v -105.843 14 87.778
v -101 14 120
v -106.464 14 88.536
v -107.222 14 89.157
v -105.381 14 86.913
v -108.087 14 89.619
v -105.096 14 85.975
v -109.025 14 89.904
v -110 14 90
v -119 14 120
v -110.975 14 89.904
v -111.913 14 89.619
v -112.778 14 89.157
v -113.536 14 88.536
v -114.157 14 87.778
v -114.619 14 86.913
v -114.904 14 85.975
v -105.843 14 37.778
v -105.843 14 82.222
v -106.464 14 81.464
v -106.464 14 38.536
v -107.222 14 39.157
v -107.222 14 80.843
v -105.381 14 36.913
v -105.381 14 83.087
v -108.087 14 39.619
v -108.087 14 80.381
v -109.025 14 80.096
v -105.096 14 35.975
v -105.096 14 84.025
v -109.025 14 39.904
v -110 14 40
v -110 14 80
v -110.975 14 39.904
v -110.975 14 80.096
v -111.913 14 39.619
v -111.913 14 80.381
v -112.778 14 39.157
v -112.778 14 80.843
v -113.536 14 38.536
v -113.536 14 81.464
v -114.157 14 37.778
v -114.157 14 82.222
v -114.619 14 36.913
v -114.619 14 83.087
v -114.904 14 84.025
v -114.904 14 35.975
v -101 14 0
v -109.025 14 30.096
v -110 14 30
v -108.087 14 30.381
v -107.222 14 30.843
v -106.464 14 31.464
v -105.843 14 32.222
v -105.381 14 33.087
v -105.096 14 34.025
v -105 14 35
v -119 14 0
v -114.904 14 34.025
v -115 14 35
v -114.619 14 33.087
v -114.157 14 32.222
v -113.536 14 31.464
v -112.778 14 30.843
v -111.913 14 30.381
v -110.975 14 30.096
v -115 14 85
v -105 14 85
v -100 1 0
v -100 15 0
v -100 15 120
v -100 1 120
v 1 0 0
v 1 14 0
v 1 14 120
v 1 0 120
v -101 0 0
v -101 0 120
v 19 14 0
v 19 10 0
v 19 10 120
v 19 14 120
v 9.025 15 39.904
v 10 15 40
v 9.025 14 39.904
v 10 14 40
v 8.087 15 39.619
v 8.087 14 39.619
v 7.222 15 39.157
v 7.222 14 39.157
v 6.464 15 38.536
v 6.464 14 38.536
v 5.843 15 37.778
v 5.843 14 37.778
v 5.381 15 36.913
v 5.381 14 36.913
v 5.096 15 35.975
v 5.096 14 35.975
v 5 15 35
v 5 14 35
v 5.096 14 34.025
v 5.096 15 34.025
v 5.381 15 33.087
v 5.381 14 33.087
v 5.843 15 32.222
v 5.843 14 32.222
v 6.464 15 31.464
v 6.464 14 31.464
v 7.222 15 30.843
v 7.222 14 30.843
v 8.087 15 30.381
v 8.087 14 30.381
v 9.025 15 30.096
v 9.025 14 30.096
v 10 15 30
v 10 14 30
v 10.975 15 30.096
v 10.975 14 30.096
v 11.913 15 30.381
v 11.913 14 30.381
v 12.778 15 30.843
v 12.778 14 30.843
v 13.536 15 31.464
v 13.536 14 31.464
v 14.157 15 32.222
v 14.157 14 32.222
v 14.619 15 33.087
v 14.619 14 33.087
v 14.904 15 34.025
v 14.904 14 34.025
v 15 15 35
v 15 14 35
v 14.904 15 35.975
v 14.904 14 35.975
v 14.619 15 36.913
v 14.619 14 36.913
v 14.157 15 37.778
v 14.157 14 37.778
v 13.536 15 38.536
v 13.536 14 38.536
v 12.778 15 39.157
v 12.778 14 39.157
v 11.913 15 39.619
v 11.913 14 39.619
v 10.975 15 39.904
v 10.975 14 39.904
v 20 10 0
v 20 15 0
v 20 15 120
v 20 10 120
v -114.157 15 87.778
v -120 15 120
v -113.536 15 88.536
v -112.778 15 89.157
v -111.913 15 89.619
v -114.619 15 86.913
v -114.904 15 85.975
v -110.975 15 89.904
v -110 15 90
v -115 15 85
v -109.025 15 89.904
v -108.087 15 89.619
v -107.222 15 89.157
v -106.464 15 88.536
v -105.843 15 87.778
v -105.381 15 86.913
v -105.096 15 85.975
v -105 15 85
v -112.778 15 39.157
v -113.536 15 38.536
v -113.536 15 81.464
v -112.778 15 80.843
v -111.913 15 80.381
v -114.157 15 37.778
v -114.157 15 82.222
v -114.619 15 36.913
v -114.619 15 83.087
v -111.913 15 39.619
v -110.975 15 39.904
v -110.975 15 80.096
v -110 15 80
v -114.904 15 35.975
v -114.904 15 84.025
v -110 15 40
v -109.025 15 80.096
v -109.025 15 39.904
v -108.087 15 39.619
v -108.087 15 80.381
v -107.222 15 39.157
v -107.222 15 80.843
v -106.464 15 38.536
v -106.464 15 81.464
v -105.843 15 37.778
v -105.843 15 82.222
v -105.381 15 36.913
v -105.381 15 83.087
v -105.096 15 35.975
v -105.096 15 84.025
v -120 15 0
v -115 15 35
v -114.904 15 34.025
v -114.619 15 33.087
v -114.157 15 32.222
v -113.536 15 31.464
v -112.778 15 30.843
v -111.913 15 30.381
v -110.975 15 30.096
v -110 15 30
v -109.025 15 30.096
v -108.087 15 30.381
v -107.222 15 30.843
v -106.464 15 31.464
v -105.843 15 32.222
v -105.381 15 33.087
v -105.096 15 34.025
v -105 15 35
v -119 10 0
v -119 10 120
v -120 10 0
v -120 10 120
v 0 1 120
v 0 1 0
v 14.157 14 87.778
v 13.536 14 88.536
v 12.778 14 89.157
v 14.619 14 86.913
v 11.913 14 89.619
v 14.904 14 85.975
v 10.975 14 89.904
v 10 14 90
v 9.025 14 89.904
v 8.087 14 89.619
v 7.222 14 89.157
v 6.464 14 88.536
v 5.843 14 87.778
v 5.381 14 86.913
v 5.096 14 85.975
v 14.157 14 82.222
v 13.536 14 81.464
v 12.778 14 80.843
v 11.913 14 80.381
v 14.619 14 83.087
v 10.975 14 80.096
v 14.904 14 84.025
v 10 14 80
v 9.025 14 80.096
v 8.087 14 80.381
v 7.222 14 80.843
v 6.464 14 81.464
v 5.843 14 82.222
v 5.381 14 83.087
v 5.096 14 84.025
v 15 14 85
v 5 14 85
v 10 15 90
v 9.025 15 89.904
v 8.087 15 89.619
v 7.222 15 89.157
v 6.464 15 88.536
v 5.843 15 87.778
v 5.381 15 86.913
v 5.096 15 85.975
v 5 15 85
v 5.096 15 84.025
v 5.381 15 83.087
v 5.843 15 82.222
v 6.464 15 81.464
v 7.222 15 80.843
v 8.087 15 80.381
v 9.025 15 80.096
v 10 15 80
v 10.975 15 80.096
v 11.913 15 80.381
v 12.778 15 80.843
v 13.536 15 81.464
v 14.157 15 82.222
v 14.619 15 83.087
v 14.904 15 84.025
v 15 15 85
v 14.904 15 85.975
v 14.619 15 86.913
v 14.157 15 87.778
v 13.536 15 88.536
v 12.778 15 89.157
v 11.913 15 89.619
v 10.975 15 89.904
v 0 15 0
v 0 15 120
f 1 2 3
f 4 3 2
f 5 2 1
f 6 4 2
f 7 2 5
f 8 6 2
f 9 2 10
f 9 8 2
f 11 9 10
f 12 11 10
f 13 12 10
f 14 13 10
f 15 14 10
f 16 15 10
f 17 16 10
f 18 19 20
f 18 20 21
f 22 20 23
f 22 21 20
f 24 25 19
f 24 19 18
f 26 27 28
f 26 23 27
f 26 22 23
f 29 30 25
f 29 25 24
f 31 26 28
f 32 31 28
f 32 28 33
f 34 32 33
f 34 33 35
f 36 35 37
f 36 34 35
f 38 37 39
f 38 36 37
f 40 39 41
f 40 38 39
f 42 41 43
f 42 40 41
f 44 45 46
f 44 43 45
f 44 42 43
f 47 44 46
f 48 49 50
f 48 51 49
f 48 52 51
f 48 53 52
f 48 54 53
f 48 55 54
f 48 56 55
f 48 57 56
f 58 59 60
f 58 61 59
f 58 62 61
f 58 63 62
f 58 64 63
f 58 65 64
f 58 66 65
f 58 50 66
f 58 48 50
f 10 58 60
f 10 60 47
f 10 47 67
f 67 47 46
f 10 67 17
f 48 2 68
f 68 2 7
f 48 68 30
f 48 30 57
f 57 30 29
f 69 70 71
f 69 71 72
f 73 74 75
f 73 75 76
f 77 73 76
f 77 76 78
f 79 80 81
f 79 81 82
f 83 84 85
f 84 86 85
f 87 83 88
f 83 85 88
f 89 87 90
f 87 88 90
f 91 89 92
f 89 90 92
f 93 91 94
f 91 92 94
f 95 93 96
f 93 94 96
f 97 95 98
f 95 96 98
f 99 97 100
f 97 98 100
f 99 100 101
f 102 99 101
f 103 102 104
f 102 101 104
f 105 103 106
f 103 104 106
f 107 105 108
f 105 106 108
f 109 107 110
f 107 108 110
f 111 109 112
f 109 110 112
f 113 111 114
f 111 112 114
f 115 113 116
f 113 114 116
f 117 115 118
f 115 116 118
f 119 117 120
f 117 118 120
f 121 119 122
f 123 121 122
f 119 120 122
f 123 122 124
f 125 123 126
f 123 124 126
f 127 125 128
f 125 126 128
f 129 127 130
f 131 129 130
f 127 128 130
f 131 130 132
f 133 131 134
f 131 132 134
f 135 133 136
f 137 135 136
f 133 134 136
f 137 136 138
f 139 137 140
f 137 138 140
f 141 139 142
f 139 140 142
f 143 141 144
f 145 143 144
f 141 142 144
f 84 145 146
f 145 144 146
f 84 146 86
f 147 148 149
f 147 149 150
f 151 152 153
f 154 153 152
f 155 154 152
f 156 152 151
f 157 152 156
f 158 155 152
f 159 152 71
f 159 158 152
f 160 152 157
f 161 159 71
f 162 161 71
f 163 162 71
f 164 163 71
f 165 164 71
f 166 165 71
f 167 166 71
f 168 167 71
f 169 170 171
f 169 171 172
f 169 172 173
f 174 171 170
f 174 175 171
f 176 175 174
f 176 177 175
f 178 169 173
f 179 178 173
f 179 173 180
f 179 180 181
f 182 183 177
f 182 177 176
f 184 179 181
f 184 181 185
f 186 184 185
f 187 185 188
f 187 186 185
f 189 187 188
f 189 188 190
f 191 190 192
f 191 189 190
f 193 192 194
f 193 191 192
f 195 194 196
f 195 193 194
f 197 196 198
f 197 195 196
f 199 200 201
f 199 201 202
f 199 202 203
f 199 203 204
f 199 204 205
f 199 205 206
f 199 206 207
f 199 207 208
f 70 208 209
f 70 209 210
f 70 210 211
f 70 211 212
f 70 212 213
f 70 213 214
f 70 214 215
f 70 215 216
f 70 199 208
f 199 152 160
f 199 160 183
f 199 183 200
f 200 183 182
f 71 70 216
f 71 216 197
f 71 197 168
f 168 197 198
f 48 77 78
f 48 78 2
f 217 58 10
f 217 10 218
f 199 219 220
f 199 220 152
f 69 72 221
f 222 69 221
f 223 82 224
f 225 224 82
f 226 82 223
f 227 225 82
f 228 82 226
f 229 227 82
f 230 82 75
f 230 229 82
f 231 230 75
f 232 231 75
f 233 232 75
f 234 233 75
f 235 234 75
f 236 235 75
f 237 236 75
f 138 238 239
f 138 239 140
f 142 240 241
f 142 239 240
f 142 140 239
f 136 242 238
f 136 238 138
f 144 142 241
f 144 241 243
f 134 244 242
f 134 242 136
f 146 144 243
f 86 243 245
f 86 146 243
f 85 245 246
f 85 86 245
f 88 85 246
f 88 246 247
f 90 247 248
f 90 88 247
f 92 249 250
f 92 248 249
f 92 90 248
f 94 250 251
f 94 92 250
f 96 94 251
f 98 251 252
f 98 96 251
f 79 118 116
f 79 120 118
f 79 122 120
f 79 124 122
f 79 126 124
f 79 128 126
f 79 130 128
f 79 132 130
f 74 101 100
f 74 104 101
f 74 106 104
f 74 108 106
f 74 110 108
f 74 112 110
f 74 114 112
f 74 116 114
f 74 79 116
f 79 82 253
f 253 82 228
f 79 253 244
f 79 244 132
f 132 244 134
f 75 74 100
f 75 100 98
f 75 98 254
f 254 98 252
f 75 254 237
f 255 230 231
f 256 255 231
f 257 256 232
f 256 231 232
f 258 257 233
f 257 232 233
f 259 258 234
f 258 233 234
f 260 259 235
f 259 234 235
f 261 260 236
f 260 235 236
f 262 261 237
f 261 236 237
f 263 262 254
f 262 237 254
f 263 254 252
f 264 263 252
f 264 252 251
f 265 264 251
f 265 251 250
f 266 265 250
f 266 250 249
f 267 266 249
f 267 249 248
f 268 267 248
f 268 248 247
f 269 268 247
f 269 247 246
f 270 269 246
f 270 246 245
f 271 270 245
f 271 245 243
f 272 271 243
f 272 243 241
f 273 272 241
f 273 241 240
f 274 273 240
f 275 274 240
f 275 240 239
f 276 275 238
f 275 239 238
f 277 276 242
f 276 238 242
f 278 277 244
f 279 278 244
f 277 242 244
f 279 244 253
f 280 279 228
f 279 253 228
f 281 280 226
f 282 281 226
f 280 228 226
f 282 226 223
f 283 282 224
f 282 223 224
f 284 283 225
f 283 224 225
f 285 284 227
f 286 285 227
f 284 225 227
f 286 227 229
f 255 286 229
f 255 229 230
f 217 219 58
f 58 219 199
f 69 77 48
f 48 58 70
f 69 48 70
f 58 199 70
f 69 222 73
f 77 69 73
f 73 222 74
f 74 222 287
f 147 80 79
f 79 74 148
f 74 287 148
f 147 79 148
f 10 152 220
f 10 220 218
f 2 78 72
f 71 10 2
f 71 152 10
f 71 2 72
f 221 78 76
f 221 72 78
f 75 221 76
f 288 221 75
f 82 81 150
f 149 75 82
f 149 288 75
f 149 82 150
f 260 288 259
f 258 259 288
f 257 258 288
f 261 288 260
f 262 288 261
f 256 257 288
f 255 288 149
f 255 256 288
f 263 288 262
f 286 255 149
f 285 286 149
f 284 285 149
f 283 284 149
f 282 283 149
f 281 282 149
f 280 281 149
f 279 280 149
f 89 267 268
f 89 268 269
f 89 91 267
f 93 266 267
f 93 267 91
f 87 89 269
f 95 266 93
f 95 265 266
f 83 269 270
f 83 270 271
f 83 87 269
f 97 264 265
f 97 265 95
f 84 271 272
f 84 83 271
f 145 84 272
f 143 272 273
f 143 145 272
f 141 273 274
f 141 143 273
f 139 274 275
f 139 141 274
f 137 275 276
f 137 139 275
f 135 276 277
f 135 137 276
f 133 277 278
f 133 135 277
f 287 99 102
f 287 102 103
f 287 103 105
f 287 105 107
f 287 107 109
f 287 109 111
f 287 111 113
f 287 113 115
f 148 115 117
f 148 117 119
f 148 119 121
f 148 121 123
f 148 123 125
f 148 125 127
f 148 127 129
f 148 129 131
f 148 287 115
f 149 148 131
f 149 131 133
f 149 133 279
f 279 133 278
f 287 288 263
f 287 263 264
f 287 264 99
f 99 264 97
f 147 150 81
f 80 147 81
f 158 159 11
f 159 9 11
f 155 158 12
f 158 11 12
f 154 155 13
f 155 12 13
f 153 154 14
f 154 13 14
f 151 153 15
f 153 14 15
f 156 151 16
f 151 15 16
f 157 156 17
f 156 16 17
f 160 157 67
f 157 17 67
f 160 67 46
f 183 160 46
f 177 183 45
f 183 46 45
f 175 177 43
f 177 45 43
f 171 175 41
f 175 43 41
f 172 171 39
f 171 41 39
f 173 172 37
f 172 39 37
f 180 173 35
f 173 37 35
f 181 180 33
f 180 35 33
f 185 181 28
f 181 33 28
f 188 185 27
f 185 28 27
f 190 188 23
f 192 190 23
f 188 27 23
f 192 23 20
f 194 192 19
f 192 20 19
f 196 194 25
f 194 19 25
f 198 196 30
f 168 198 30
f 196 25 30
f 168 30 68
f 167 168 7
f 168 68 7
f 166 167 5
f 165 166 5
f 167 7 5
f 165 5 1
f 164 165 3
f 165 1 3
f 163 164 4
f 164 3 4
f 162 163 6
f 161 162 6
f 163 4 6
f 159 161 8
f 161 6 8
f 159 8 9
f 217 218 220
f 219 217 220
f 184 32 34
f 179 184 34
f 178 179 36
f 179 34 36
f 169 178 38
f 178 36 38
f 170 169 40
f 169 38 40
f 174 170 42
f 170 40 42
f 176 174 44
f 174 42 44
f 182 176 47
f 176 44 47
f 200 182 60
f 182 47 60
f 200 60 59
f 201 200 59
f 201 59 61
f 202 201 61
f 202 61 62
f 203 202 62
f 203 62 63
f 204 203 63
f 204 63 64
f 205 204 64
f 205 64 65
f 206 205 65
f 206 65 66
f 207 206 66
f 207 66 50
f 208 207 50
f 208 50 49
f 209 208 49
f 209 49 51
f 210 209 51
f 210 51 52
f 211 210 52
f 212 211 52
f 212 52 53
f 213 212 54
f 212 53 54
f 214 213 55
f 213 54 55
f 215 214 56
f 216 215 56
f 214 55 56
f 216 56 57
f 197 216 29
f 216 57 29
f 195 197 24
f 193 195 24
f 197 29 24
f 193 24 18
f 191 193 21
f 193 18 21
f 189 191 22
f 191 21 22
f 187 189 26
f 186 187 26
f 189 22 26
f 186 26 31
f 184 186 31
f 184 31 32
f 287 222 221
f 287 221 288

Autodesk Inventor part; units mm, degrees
ref_plane "YZ Plane" through (0, 0, 0) normal (1, 0, 0) x (0, 1, 0)
ref_plane "XZ Plane" through (0, 0, 0) normal (0, 1, 0) x (-1, 0, 0)
ref_plane "XY Plane" through (0, 0, 0) normal (0, 0, 1) x (1, 0, 0)
sketch "Sketch1" plane through (0, 0, 0) normal (0, 0, 1) x (1, 0, 0)
  line L0 (0, 0) -> (0, 1)
  line L1 (0, 1) -> (0, 15)
  line L2 (0, 15) -> (20, 15)
  line L3 (20, 15) -> (20, 10)
  line L4 (20, 10) -> (19, 10)
  line L5 (19, 10) -> (19, 14)
  line L6 (19, 14) -> (1, 14)
  line L7 (1, 14) -> (1, 0)
  line L8 (1, 0) -> (-101, 0)
  line L9 (-101, 0) -> (-101, 14)
  line L10 (-101, 14) -> (-119, 14)
  line L11 (-119, 14) -> (-119, 10)
  line L12 (-119, 10) -> (-120, 10)
  line L13 (-120, 10) -> (-120, 15)
  line L14 (-120, 15) -> (-100, 15)
  line L15 (-100, 15) -> (-100, 1)
  line L16 (-100, 1) -> (0, 1)
  dimension "d1" = 14
  dimension "d2" = 20
  dimension "d3" = 5
  dimension "d4" = 1
  dimension "d5" = 4
  dimension "d6" = 18
  dimension "d7" = 102
  dimension "d8" = 14
  dimension "d9" = 18
  dimension "d10" = 4
  dimension "d11" = 1
  dimension "d12" = 5
  dimension "d13" = 20
  dimension "d14" = 14
extrude "Extrusion1" add sketch "Sketch1" along normal blind 120
sketch "Sketch2" plane through (0, 15, 0) normal (0, 1, 0) x (1, 0, 0)
  circle A0 centre (10, -85) radius 5
  circle A1 centre (10, -35) radius 5
  circle A2 centre (-110, -35) radius 5
  circle A3 centre (-110, -85) radius 5
  line L0 (20, 0) -> (20, -120) projected
  line L1 (20, 0) -> (0, 0) projected
  line L2 (20, -120) -> (0, -120) projected
  line L3 (-120, 0) -> (-120, -120) projected
  dimension "d17" = 10
  dimension "d18" = 10
  dimension "d19" = 10
  dimension "d20" = 10
hole "Hole1" at (10, 15, 85) at (10, 15, 35) at (-110, 15, 35) at (-110, 15, 85) direction (0, -1, 0) diameter 10 end through all
properties part number "Pallet"
